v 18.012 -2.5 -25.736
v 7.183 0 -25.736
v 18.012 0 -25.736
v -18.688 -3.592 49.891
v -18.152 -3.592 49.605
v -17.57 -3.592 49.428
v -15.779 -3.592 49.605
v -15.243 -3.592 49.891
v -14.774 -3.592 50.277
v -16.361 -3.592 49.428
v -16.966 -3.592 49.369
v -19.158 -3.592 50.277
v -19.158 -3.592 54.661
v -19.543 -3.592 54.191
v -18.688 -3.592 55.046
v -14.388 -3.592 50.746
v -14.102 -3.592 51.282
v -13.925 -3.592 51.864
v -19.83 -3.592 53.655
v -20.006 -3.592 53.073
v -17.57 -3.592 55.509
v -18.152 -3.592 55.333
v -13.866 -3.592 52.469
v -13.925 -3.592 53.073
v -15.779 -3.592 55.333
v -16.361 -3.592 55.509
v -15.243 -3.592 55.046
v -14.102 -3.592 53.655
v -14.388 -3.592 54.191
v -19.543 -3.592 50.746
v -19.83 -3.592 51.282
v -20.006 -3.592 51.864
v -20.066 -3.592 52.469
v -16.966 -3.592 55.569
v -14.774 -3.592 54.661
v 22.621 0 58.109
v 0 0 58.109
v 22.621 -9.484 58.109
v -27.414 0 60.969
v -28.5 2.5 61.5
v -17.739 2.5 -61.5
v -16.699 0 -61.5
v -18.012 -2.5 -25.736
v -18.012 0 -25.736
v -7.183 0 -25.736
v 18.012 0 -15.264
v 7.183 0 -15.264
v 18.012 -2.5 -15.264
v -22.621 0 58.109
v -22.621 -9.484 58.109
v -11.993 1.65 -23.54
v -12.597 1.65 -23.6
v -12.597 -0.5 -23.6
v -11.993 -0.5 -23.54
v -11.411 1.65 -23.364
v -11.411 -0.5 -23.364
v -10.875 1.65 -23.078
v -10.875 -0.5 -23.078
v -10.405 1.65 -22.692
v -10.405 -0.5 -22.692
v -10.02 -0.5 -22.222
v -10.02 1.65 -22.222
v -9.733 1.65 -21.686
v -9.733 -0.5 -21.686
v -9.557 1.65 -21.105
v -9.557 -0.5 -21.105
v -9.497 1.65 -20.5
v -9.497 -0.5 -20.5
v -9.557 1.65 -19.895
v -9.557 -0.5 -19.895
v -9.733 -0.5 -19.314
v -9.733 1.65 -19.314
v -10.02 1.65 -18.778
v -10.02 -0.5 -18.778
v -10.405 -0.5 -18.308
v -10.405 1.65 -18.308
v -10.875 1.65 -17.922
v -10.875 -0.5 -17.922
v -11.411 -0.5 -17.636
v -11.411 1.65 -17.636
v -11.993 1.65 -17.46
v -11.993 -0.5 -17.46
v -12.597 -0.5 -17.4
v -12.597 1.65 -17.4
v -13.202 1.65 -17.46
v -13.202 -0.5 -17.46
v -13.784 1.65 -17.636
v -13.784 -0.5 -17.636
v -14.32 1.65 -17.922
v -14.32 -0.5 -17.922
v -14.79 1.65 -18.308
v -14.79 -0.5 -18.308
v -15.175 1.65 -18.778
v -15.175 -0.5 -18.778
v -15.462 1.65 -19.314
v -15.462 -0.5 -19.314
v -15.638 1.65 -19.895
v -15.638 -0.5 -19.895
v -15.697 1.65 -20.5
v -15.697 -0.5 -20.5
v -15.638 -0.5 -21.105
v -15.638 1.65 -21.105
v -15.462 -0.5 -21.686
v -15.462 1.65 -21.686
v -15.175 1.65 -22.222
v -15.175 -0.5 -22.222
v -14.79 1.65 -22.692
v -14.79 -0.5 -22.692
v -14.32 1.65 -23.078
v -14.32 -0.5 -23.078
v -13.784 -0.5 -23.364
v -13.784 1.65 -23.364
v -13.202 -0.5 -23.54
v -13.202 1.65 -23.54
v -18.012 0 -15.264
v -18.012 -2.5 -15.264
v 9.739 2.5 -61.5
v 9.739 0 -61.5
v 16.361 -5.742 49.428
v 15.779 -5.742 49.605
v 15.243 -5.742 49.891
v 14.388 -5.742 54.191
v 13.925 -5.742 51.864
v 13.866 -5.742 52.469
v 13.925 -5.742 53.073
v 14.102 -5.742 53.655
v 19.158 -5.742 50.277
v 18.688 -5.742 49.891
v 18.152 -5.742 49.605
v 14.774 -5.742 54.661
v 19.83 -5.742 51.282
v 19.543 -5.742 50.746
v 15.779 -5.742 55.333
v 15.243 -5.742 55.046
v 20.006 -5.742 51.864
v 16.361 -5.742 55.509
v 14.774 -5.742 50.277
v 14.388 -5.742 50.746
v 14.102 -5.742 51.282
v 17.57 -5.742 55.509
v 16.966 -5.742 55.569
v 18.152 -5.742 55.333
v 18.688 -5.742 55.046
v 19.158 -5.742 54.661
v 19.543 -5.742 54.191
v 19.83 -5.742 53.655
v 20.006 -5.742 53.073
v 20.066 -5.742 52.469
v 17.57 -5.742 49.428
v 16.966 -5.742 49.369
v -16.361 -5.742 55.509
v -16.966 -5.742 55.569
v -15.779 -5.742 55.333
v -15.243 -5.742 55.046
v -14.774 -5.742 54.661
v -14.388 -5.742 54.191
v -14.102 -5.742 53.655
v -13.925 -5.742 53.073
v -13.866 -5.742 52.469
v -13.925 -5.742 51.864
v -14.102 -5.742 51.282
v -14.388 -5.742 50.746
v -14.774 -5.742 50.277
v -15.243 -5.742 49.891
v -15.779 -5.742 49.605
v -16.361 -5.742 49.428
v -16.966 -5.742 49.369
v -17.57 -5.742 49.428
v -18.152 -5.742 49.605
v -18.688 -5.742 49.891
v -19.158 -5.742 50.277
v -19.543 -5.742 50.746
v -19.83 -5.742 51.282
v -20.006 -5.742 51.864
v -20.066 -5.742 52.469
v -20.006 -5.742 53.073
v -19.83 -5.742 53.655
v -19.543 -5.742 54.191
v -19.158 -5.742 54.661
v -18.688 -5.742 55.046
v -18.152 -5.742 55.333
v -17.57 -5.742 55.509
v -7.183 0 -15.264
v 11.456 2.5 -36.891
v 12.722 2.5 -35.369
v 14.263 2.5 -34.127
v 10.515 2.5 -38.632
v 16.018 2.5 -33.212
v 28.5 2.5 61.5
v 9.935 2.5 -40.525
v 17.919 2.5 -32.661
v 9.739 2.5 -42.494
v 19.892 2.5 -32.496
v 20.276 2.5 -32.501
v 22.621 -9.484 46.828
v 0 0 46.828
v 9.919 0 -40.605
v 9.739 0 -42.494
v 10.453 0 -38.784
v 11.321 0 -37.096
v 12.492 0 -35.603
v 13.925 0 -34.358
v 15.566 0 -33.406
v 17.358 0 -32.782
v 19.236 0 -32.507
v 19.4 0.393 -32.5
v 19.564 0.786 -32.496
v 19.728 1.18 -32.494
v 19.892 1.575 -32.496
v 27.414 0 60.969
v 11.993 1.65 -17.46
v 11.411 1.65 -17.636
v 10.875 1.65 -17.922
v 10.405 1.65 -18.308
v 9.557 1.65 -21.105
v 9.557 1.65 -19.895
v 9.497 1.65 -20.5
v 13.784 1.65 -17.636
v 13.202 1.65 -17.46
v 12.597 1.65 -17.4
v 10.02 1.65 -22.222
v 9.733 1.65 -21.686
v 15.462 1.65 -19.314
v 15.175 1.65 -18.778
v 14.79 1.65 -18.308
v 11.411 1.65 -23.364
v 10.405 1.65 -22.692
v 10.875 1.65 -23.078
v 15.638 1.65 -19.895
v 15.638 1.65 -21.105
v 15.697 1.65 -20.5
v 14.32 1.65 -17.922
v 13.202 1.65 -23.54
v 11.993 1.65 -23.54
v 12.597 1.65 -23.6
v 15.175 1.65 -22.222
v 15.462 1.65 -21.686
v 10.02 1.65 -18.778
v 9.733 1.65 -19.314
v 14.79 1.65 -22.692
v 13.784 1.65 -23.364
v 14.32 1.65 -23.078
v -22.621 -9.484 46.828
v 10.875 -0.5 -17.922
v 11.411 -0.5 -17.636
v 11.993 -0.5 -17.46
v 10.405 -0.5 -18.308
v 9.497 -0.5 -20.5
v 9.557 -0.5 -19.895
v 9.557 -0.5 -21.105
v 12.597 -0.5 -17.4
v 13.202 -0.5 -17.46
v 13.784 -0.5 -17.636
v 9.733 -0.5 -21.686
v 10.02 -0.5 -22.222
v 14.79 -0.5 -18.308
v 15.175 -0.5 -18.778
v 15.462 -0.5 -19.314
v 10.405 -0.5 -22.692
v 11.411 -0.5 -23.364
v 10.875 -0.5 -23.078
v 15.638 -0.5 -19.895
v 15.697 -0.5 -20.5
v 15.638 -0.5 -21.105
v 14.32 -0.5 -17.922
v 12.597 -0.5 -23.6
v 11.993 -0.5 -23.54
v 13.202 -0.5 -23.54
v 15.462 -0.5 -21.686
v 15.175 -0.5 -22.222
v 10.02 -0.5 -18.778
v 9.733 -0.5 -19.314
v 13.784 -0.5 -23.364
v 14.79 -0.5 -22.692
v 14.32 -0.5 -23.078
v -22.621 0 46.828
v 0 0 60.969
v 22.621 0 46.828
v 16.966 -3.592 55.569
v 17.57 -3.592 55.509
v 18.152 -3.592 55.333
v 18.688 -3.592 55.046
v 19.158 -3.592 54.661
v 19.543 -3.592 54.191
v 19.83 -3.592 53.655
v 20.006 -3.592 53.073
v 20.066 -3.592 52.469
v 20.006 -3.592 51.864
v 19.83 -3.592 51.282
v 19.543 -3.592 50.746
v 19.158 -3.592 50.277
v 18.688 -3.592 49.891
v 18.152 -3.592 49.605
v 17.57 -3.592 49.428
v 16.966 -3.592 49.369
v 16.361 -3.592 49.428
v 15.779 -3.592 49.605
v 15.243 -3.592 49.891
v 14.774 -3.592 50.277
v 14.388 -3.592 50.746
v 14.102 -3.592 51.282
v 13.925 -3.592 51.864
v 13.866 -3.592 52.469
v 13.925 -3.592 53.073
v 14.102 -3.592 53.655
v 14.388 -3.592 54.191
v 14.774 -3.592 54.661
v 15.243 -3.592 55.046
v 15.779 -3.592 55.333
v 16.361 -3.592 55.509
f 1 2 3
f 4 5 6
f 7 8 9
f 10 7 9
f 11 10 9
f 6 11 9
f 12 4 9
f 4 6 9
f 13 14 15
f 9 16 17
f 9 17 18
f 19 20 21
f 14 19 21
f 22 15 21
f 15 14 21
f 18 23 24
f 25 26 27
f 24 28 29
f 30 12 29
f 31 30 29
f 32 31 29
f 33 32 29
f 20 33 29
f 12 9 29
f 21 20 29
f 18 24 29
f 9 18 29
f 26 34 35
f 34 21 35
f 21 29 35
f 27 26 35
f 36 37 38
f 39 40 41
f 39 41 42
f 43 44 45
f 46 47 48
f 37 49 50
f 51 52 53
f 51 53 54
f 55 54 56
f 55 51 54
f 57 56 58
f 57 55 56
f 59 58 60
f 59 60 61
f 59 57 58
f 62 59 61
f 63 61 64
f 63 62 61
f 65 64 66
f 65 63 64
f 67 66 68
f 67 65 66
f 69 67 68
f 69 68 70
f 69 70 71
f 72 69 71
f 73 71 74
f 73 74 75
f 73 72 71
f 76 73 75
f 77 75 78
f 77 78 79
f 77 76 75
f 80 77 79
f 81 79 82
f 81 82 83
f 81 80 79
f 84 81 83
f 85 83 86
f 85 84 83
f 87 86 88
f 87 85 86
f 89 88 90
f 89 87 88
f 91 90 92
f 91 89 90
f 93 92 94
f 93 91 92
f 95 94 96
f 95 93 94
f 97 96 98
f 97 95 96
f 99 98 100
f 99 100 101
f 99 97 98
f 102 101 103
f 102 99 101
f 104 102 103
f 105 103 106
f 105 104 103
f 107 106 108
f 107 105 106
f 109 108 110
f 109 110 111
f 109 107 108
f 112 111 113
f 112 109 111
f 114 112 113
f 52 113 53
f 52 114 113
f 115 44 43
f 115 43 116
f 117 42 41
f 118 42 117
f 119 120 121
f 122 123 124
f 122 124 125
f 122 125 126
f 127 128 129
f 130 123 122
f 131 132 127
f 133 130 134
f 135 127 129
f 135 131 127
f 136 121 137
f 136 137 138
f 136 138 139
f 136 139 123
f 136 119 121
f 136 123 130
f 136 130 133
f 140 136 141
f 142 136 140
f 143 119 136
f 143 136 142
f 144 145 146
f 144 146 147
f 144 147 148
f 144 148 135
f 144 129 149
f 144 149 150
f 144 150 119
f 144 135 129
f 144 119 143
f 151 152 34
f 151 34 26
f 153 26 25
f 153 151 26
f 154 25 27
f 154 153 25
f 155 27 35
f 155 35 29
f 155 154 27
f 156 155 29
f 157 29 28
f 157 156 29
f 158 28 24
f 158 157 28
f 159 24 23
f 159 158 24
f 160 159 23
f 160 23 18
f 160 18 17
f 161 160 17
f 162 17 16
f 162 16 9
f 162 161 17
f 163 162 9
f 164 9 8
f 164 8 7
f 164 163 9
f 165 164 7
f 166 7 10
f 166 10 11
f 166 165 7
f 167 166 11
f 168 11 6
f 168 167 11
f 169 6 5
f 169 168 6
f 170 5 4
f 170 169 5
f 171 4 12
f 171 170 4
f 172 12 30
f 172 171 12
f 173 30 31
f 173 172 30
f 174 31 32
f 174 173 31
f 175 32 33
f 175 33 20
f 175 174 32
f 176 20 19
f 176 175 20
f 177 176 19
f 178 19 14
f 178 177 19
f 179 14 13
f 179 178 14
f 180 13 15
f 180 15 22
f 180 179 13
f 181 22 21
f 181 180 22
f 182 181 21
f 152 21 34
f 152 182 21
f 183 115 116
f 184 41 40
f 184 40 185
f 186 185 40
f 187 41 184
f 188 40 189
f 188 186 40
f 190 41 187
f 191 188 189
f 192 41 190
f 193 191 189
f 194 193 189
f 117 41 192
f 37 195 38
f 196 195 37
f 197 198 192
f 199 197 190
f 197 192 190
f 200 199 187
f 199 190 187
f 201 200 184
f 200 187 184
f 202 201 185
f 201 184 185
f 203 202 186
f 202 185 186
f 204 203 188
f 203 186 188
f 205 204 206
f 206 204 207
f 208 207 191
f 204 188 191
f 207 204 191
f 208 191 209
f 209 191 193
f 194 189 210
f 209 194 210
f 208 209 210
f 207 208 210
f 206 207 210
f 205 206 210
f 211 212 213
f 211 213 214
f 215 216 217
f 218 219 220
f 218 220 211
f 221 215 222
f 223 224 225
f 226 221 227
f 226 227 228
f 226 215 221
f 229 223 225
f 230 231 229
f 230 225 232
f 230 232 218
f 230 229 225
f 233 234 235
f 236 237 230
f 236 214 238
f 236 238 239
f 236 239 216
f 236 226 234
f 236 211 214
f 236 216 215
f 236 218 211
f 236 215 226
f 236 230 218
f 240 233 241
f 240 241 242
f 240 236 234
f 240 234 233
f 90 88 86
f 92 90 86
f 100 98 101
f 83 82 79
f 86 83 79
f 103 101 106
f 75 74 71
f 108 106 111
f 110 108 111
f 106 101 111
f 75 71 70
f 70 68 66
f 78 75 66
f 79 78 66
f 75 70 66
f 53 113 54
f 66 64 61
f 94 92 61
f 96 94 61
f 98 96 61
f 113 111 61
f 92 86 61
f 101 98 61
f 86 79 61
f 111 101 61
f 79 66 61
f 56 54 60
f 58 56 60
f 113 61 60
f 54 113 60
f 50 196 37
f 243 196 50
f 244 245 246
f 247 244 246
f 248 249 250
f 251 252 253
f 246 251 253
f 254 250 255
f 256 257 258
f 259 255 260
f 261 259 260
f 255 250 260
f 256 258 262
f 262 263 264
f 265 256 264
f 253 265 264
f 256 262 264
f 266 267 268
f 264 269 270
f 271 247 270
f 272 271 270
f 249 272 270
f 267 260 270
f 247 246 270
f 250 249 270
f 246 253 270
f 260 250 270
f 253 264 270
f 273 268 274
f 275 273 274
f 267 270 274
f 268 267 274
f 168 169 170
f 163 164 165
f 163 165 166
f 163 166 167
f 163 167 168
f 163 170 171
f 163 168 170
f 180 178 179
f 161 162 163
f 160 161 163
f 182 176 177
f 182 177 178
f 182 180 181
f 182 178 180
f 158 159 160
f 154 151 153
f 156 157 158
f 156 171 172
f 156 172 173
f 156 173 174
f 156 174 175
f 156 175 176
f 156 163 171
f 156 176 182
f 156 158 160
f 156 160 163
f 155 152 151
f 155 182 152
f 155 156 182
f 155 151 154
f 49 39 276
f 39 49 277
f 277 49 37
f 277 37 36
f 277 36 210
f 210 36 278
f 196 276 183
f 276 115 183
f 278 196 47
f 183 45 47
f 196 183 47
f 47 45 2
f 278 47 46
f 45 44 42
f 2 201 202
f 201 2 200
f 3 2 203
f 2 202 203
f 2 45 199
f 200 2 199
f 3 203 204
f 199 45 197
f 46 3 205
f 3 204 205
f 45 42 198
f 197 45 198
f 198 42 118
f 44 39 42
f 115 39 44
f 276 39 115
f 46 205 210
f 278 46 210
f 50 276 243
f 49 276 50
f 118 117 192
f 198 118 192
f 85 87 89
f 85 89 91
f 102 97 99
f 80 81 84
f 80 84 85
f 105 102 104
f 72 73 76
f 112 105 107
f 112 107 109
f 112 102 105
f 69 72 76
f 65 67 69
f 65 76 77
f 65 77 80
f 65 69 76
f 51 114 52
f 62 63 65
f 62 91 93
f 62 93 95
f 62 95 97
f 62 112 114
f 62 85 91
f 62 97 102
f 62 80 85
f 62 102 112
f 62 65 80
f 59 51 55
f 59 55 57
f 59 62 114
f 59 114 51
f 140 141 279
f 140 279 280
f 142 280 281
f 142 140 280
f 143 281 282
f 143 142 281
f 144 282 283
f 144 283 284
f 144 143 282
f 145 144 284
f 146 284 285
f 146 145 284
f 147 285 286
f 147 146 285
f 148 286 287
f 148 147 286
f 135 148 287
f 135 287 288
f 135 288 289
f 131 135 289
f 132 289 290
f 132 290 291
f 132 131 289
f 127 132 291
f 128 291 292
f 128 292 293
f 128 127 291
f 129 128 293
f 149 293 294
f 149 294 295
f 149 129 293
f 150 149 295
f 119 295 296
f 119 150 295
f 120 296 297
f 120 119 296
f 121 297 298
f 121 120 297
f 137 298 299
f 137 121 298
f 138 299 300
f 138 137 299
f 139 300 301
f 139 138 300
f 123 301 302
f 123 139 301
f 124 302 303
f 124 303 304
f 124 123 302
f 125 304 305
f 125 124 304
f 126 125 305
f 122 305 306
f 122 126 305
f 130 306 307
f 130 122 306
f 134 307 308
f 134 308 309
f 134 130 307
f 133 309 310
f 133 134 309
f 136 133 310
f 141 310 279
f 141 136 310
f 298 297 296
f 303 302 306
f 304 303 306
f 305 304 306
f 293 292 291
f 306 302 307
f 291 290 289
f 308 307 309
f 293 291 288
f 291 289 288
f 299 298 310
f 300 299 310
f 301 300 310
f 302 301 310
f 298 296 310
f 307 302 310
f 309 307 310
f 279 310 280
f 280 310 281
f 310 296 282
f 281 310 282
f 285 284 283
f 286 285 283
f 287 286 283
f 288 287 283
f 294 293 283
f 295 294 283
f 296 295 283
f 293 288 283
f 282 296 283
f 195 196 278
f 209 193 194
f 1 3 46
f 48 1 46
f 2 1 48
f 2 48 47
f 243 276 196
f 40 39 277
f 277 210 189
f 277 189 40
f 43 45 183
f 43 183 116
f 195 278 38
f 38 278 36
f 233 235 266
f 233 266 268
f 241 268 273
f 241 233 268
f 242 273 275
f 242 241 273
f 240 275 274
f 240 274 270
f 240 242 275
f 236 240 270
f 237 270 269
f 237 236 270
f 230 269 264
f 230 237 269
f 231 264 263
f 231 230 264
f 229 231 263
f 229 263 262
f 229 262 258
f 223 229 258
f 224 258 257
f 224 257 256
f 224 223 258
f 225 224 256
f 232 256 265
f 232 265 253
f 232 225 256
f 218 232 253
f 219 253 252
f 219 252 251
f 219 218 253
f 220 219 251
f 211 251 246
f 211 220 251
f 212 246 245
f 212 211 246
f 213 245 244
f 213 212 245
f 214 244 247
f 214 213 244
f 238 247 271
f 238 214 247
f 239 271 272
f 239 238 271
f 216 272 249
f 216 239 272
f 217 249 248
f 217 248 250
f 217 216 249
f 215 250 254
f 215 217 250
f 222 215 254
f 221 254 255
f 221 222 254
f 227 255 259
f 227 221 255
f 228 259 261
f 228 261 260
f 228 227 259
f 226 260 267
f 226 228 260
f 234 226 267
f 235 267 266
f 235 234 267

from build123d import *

# Parameters (mm, degrees)
SKIZZE1_W                            = 57
SKIZZE1_H                            = 123
AUFSATZ_LINEAR_AUSTRAGEN1_DEPTH      = 2.5
SCHNITT_LINEAR_AUSTRAGEN1_DEPTH      = 84.889808678
SCHNITT_LINEAR_AUSTRAGEN2_DEPTH      = 68.828828679
SCHNITT_LINEAR_AUSTRAGEN3_DEPTH      = 70.726045338
SCHNITT_LINEAR_AUSTRAGEN3_DEPTH_BACK = 70.726045338
SCHNITT_LINEAR_AUSTRAGEN4_DEPTH      = 70.47454308
SCHNITT_LINEAR_AUSTRAGEN4_DEPTH_BACK = 70.47454308
SKIZZE9_W                            = 45.241474544
SKIZZE9_H                            = 11.280630507
AUFSATZ_LINEAR_AUSTRAGEN2_DEPTH      = 13
SCHNITT_LINEAR_AUSTRAGEN5_DEPTH      = 20
SKIZZE12_W                           = 36.023643564
SKIZZE12_H                           = 10.472363364
AUFSATZ_LINEAR_AUSTRAGEN3_DEPTH      = 5
SCHNITT_LINEAR_AUSTRAGEN6_DEPTH      = 12
SCHNITT_LINEAR_AUSTRAGEN8_DEPTH      = 0.5
SCHNITT_LINEAR_AUSTRAGEN8_DEPTH_BACK = 1.65
SKIZZE16_R                           = 3.1
SCHNITT_LINEAR_AUSTRAGEN9_DEPTH      = 1.15
SCHNITT_LINEAR_AUSTRAGEN9_DEPTH_BACK = 1
SKIZZE17_R                           = 3.1
SCHNITT_LINEAR_AUSTRAGEN10_DEPTH     = 10


with BuildPart() as part:
    # Skizze1 → Aufsatz-Linear austragen1 (new body)
    with BuildSketch(Plane(origin=(0, 0, 0), x_dir=(1, 0, 0), z_dir=(0, 1, 0))):
        Rectangle(SKIZZE1_W, SKIZZE1_H)
    extrude(amount=AUFSATZ_LINEAR_AUSTRAGEN1_DEPTH)

    # Skizze2 → Schnitt-Linear austragen1 (cut, through all)
    with BuildSketch(Plane(origin=(28.5, 0, 0), x_dir=(0, 0, -1), z_dir=(1, 0, 0))):
        Polygon((-61.5, 2.5), (-61.5, 0), (-60.968608596, 0), align=None)
    extrude(amount=-SCHNITT_LINEAR_AUSTRAGEN1_DEPTH, mode=Mode.SUBTRACT)

    # Skizze3 → Schnitt-Linear austragen2 (cut, through all)
    with BuildSketch(Plane(origin=(0, 2.5, 0), x_dir=(1, 0, 0), z_dir=(0, 1, 0))):
        Polygon((-28.5, -61.5), (-17.738894386, 61.5), (-28.5, 61.5), align=None)
        Polygon((28.5, -61.5), (17.738894386, 61.5), (28.5, 61.5), align=None)
    extrude(amount=-SCHNITT_LINEAR_AUSTRAGEN2_DEPTH, mode=Mode.SUBTRACT)

    # Skizze5 → Schnitt-Linear austragen3 (cut, two sides: drawn at the far end of the back side and taken through both)
    with BuildSketch(Plane(origin=(0.175618176, 0, 2.007324937), x_dir=(0, -1, 0), z_dir=(0.08715574274765484, 0, 0.9961946980917459)).offset(-SCHNITT_LINEAR_AUSTRAGEN3_DEPTH_BACK)):
        Polygon((0.008562414, 23.031470717), (-2.5, 23.031470717), (0, 21.995936811), align=None)
    extrude(amount=SCHNITT_LINEAR_AUSTRAGEN3_DEPTH + SCHNITT_LINEAR_AUSTRAGEN3_DEPTH_BACK, mode=Mode.SUBTRACT)

    # Skizze6 → Schnitt-Linear austragen4 (cut, two sides: drawn at the far end of the back side and taken through both)
    with BuildSketch(Plane(origin=(-0.152372814, 0, 1.741629235), x_dir=(0, 1, 0), z_dir=(-0.08715574274766175, 0, 0.9961946980917452)).offset(-SCHNITT_LINEAR_AUSTRAGEN4_DEPTH_BACK)):
        Polygon((2.5, 23.031470717), (0, 21.995936811), (0, 23.031470717), align=None)
    extrude(amount=SCHNITT_LINEAR_AUSTRAGEN4_DEPTH + SCHNITT_LINEAR_AUSTRAGEN4_DEPTH_BACK, mode=Mode.SUBTRACT)

    # Skizze9 → Aufsatz-Linear austragen2 (add)
    with BuildSketch(Plane.XZ):
        with Locations((0, 52.468608596)):
            Rectangle(SKIZZE9_W, SKIZZE9_H)
    extrude(amount=AUFSATZ_LINEAR_AUSTRAGEN2_DEPTH)

    # Skizze11 → Schnitt-Linear austragen5 (cut)
    with BuildSketch(Plane(origin=(0, 0, 46.828293342), x_dir=(-1, 0, 0), z_dir=(0, 0, -1))):
        Polygon((-22.620737272, -9.484039906), (0, 0), (22.620737272, -9.484039906), (22.620737272, -13), (-22.620737272, -13), align=None)
    extrude(amount=-SCHNITT_LINEAR_AUSTRAGEN5_DEPTH, mode=Mode.SUBTRACT)

    # Skizze12 → Aufsatz-Linear austragen3 (add)
    with BuildSketch(Plane.XZ):
        with Locations((0, -20.5)):
            Rectangle(SKIZZE12_W, SKIZZE12_H)
    extrude(amount=AUFSATZ_LINEAR_AUSTRAGEN3_DEPTH)

    # Skizze13 → Schnitt-Linear austragen6 (cut)
    with BuildSketch(Plane(origin=(0, 0, -25.736181682), x_dir=(-1, 0, 0), z_dir=(0, 0, -1))):
        Polygon((-18.011821782, -2.5), (-7.183132097, 0), (7.183132097, 0), (18.011821782, -2.5), (18.011821782, -5), (-18.011821782, -5), align=None)
    extrude(amount=-SCHNITT_LINEAR_AUSTRAGEN6_DEPTH, mode=Mode.SUBTRACT)

    # Skizze16 → Schnitt-Linear austragen8 (cut, two sides: drawn at the far end of the back side and taken through both)
    with BuildSketch(Plane.XZ.offset(-SCHNITT_LINEAR_AUSTRAGEN8_DEPTH_BACK)):
        with Locations((12.59747694, -20.5)):
            Circle(SKIZZE16_R)
        with Locations((-12.59747694, -20.5)):
            Circle(SKIZZE16_R)
    extrude(amount=SCHNITT_LINEAR_AUSTRAGEN8_DEPTH + SCHNITT_LINEAR_AUSTRAGEN8_DEPTH_BACK, mode=Mode.SUBTRACT)

    # Skizze17 → Schnitt-Linear austragen9 (cut, two sides: drawn at the far end of the back side and taken through both)
    with BuildSketch(Plane(origin=(0, -4.742019953, 0), x_dir=(1, 0, 0), z_dir=(0, 1, 0)).offset(-SCHNITT_LINEAR_AUSTRAGEN9_DEPTH_BACK)):
        with Locations((-16.965552954, -52.468608596)):
            Circle(SKIZZE17_R)
        with Locations((16.965552954, -52.468608596)):
            Circle(SKIZZE17_R)
    extrude(amount=SCHNITT_LINEAR_AUSTRAGEN9_DEPTH + SCHNITT_LINEAR_AUSTRAGEN9_DEPTH_BACK, mode=Mode.SUBTRACT)

    # Skizze18 → Schnitt-Linear austragen10 (cut)
    with BuildSketch(Plane(origin=(0, 2.5, 0), x_dir=(1, 0, 0), z_dir=(0, 1, 0))):
        with BuildLine():
            Line((17.738894386, 61.5), (9.738894386, 61.5))
            Line((9.738894386, 61.5), (9.738894386, 42.5))
            Line((9.738894386, 42.5), (9.738894386, 42.494341137))
            ThreePointArc((9.738894386, 42.494341137), (12.722062254, 35.369450483), (19.891707751, 32.495508801))
            Line((19.891707751, 32.495508801), (20.275944794, 32.501381142))
            Line((20.275944794, 32.501381142), (17.738894386, 61.5))
        make_face()
    extrude(amount=-SCHNITT_LINEAR_AUSTRAGEN10_DEPTH, mode=Mode.SUBTRACT)


solid = part.part
